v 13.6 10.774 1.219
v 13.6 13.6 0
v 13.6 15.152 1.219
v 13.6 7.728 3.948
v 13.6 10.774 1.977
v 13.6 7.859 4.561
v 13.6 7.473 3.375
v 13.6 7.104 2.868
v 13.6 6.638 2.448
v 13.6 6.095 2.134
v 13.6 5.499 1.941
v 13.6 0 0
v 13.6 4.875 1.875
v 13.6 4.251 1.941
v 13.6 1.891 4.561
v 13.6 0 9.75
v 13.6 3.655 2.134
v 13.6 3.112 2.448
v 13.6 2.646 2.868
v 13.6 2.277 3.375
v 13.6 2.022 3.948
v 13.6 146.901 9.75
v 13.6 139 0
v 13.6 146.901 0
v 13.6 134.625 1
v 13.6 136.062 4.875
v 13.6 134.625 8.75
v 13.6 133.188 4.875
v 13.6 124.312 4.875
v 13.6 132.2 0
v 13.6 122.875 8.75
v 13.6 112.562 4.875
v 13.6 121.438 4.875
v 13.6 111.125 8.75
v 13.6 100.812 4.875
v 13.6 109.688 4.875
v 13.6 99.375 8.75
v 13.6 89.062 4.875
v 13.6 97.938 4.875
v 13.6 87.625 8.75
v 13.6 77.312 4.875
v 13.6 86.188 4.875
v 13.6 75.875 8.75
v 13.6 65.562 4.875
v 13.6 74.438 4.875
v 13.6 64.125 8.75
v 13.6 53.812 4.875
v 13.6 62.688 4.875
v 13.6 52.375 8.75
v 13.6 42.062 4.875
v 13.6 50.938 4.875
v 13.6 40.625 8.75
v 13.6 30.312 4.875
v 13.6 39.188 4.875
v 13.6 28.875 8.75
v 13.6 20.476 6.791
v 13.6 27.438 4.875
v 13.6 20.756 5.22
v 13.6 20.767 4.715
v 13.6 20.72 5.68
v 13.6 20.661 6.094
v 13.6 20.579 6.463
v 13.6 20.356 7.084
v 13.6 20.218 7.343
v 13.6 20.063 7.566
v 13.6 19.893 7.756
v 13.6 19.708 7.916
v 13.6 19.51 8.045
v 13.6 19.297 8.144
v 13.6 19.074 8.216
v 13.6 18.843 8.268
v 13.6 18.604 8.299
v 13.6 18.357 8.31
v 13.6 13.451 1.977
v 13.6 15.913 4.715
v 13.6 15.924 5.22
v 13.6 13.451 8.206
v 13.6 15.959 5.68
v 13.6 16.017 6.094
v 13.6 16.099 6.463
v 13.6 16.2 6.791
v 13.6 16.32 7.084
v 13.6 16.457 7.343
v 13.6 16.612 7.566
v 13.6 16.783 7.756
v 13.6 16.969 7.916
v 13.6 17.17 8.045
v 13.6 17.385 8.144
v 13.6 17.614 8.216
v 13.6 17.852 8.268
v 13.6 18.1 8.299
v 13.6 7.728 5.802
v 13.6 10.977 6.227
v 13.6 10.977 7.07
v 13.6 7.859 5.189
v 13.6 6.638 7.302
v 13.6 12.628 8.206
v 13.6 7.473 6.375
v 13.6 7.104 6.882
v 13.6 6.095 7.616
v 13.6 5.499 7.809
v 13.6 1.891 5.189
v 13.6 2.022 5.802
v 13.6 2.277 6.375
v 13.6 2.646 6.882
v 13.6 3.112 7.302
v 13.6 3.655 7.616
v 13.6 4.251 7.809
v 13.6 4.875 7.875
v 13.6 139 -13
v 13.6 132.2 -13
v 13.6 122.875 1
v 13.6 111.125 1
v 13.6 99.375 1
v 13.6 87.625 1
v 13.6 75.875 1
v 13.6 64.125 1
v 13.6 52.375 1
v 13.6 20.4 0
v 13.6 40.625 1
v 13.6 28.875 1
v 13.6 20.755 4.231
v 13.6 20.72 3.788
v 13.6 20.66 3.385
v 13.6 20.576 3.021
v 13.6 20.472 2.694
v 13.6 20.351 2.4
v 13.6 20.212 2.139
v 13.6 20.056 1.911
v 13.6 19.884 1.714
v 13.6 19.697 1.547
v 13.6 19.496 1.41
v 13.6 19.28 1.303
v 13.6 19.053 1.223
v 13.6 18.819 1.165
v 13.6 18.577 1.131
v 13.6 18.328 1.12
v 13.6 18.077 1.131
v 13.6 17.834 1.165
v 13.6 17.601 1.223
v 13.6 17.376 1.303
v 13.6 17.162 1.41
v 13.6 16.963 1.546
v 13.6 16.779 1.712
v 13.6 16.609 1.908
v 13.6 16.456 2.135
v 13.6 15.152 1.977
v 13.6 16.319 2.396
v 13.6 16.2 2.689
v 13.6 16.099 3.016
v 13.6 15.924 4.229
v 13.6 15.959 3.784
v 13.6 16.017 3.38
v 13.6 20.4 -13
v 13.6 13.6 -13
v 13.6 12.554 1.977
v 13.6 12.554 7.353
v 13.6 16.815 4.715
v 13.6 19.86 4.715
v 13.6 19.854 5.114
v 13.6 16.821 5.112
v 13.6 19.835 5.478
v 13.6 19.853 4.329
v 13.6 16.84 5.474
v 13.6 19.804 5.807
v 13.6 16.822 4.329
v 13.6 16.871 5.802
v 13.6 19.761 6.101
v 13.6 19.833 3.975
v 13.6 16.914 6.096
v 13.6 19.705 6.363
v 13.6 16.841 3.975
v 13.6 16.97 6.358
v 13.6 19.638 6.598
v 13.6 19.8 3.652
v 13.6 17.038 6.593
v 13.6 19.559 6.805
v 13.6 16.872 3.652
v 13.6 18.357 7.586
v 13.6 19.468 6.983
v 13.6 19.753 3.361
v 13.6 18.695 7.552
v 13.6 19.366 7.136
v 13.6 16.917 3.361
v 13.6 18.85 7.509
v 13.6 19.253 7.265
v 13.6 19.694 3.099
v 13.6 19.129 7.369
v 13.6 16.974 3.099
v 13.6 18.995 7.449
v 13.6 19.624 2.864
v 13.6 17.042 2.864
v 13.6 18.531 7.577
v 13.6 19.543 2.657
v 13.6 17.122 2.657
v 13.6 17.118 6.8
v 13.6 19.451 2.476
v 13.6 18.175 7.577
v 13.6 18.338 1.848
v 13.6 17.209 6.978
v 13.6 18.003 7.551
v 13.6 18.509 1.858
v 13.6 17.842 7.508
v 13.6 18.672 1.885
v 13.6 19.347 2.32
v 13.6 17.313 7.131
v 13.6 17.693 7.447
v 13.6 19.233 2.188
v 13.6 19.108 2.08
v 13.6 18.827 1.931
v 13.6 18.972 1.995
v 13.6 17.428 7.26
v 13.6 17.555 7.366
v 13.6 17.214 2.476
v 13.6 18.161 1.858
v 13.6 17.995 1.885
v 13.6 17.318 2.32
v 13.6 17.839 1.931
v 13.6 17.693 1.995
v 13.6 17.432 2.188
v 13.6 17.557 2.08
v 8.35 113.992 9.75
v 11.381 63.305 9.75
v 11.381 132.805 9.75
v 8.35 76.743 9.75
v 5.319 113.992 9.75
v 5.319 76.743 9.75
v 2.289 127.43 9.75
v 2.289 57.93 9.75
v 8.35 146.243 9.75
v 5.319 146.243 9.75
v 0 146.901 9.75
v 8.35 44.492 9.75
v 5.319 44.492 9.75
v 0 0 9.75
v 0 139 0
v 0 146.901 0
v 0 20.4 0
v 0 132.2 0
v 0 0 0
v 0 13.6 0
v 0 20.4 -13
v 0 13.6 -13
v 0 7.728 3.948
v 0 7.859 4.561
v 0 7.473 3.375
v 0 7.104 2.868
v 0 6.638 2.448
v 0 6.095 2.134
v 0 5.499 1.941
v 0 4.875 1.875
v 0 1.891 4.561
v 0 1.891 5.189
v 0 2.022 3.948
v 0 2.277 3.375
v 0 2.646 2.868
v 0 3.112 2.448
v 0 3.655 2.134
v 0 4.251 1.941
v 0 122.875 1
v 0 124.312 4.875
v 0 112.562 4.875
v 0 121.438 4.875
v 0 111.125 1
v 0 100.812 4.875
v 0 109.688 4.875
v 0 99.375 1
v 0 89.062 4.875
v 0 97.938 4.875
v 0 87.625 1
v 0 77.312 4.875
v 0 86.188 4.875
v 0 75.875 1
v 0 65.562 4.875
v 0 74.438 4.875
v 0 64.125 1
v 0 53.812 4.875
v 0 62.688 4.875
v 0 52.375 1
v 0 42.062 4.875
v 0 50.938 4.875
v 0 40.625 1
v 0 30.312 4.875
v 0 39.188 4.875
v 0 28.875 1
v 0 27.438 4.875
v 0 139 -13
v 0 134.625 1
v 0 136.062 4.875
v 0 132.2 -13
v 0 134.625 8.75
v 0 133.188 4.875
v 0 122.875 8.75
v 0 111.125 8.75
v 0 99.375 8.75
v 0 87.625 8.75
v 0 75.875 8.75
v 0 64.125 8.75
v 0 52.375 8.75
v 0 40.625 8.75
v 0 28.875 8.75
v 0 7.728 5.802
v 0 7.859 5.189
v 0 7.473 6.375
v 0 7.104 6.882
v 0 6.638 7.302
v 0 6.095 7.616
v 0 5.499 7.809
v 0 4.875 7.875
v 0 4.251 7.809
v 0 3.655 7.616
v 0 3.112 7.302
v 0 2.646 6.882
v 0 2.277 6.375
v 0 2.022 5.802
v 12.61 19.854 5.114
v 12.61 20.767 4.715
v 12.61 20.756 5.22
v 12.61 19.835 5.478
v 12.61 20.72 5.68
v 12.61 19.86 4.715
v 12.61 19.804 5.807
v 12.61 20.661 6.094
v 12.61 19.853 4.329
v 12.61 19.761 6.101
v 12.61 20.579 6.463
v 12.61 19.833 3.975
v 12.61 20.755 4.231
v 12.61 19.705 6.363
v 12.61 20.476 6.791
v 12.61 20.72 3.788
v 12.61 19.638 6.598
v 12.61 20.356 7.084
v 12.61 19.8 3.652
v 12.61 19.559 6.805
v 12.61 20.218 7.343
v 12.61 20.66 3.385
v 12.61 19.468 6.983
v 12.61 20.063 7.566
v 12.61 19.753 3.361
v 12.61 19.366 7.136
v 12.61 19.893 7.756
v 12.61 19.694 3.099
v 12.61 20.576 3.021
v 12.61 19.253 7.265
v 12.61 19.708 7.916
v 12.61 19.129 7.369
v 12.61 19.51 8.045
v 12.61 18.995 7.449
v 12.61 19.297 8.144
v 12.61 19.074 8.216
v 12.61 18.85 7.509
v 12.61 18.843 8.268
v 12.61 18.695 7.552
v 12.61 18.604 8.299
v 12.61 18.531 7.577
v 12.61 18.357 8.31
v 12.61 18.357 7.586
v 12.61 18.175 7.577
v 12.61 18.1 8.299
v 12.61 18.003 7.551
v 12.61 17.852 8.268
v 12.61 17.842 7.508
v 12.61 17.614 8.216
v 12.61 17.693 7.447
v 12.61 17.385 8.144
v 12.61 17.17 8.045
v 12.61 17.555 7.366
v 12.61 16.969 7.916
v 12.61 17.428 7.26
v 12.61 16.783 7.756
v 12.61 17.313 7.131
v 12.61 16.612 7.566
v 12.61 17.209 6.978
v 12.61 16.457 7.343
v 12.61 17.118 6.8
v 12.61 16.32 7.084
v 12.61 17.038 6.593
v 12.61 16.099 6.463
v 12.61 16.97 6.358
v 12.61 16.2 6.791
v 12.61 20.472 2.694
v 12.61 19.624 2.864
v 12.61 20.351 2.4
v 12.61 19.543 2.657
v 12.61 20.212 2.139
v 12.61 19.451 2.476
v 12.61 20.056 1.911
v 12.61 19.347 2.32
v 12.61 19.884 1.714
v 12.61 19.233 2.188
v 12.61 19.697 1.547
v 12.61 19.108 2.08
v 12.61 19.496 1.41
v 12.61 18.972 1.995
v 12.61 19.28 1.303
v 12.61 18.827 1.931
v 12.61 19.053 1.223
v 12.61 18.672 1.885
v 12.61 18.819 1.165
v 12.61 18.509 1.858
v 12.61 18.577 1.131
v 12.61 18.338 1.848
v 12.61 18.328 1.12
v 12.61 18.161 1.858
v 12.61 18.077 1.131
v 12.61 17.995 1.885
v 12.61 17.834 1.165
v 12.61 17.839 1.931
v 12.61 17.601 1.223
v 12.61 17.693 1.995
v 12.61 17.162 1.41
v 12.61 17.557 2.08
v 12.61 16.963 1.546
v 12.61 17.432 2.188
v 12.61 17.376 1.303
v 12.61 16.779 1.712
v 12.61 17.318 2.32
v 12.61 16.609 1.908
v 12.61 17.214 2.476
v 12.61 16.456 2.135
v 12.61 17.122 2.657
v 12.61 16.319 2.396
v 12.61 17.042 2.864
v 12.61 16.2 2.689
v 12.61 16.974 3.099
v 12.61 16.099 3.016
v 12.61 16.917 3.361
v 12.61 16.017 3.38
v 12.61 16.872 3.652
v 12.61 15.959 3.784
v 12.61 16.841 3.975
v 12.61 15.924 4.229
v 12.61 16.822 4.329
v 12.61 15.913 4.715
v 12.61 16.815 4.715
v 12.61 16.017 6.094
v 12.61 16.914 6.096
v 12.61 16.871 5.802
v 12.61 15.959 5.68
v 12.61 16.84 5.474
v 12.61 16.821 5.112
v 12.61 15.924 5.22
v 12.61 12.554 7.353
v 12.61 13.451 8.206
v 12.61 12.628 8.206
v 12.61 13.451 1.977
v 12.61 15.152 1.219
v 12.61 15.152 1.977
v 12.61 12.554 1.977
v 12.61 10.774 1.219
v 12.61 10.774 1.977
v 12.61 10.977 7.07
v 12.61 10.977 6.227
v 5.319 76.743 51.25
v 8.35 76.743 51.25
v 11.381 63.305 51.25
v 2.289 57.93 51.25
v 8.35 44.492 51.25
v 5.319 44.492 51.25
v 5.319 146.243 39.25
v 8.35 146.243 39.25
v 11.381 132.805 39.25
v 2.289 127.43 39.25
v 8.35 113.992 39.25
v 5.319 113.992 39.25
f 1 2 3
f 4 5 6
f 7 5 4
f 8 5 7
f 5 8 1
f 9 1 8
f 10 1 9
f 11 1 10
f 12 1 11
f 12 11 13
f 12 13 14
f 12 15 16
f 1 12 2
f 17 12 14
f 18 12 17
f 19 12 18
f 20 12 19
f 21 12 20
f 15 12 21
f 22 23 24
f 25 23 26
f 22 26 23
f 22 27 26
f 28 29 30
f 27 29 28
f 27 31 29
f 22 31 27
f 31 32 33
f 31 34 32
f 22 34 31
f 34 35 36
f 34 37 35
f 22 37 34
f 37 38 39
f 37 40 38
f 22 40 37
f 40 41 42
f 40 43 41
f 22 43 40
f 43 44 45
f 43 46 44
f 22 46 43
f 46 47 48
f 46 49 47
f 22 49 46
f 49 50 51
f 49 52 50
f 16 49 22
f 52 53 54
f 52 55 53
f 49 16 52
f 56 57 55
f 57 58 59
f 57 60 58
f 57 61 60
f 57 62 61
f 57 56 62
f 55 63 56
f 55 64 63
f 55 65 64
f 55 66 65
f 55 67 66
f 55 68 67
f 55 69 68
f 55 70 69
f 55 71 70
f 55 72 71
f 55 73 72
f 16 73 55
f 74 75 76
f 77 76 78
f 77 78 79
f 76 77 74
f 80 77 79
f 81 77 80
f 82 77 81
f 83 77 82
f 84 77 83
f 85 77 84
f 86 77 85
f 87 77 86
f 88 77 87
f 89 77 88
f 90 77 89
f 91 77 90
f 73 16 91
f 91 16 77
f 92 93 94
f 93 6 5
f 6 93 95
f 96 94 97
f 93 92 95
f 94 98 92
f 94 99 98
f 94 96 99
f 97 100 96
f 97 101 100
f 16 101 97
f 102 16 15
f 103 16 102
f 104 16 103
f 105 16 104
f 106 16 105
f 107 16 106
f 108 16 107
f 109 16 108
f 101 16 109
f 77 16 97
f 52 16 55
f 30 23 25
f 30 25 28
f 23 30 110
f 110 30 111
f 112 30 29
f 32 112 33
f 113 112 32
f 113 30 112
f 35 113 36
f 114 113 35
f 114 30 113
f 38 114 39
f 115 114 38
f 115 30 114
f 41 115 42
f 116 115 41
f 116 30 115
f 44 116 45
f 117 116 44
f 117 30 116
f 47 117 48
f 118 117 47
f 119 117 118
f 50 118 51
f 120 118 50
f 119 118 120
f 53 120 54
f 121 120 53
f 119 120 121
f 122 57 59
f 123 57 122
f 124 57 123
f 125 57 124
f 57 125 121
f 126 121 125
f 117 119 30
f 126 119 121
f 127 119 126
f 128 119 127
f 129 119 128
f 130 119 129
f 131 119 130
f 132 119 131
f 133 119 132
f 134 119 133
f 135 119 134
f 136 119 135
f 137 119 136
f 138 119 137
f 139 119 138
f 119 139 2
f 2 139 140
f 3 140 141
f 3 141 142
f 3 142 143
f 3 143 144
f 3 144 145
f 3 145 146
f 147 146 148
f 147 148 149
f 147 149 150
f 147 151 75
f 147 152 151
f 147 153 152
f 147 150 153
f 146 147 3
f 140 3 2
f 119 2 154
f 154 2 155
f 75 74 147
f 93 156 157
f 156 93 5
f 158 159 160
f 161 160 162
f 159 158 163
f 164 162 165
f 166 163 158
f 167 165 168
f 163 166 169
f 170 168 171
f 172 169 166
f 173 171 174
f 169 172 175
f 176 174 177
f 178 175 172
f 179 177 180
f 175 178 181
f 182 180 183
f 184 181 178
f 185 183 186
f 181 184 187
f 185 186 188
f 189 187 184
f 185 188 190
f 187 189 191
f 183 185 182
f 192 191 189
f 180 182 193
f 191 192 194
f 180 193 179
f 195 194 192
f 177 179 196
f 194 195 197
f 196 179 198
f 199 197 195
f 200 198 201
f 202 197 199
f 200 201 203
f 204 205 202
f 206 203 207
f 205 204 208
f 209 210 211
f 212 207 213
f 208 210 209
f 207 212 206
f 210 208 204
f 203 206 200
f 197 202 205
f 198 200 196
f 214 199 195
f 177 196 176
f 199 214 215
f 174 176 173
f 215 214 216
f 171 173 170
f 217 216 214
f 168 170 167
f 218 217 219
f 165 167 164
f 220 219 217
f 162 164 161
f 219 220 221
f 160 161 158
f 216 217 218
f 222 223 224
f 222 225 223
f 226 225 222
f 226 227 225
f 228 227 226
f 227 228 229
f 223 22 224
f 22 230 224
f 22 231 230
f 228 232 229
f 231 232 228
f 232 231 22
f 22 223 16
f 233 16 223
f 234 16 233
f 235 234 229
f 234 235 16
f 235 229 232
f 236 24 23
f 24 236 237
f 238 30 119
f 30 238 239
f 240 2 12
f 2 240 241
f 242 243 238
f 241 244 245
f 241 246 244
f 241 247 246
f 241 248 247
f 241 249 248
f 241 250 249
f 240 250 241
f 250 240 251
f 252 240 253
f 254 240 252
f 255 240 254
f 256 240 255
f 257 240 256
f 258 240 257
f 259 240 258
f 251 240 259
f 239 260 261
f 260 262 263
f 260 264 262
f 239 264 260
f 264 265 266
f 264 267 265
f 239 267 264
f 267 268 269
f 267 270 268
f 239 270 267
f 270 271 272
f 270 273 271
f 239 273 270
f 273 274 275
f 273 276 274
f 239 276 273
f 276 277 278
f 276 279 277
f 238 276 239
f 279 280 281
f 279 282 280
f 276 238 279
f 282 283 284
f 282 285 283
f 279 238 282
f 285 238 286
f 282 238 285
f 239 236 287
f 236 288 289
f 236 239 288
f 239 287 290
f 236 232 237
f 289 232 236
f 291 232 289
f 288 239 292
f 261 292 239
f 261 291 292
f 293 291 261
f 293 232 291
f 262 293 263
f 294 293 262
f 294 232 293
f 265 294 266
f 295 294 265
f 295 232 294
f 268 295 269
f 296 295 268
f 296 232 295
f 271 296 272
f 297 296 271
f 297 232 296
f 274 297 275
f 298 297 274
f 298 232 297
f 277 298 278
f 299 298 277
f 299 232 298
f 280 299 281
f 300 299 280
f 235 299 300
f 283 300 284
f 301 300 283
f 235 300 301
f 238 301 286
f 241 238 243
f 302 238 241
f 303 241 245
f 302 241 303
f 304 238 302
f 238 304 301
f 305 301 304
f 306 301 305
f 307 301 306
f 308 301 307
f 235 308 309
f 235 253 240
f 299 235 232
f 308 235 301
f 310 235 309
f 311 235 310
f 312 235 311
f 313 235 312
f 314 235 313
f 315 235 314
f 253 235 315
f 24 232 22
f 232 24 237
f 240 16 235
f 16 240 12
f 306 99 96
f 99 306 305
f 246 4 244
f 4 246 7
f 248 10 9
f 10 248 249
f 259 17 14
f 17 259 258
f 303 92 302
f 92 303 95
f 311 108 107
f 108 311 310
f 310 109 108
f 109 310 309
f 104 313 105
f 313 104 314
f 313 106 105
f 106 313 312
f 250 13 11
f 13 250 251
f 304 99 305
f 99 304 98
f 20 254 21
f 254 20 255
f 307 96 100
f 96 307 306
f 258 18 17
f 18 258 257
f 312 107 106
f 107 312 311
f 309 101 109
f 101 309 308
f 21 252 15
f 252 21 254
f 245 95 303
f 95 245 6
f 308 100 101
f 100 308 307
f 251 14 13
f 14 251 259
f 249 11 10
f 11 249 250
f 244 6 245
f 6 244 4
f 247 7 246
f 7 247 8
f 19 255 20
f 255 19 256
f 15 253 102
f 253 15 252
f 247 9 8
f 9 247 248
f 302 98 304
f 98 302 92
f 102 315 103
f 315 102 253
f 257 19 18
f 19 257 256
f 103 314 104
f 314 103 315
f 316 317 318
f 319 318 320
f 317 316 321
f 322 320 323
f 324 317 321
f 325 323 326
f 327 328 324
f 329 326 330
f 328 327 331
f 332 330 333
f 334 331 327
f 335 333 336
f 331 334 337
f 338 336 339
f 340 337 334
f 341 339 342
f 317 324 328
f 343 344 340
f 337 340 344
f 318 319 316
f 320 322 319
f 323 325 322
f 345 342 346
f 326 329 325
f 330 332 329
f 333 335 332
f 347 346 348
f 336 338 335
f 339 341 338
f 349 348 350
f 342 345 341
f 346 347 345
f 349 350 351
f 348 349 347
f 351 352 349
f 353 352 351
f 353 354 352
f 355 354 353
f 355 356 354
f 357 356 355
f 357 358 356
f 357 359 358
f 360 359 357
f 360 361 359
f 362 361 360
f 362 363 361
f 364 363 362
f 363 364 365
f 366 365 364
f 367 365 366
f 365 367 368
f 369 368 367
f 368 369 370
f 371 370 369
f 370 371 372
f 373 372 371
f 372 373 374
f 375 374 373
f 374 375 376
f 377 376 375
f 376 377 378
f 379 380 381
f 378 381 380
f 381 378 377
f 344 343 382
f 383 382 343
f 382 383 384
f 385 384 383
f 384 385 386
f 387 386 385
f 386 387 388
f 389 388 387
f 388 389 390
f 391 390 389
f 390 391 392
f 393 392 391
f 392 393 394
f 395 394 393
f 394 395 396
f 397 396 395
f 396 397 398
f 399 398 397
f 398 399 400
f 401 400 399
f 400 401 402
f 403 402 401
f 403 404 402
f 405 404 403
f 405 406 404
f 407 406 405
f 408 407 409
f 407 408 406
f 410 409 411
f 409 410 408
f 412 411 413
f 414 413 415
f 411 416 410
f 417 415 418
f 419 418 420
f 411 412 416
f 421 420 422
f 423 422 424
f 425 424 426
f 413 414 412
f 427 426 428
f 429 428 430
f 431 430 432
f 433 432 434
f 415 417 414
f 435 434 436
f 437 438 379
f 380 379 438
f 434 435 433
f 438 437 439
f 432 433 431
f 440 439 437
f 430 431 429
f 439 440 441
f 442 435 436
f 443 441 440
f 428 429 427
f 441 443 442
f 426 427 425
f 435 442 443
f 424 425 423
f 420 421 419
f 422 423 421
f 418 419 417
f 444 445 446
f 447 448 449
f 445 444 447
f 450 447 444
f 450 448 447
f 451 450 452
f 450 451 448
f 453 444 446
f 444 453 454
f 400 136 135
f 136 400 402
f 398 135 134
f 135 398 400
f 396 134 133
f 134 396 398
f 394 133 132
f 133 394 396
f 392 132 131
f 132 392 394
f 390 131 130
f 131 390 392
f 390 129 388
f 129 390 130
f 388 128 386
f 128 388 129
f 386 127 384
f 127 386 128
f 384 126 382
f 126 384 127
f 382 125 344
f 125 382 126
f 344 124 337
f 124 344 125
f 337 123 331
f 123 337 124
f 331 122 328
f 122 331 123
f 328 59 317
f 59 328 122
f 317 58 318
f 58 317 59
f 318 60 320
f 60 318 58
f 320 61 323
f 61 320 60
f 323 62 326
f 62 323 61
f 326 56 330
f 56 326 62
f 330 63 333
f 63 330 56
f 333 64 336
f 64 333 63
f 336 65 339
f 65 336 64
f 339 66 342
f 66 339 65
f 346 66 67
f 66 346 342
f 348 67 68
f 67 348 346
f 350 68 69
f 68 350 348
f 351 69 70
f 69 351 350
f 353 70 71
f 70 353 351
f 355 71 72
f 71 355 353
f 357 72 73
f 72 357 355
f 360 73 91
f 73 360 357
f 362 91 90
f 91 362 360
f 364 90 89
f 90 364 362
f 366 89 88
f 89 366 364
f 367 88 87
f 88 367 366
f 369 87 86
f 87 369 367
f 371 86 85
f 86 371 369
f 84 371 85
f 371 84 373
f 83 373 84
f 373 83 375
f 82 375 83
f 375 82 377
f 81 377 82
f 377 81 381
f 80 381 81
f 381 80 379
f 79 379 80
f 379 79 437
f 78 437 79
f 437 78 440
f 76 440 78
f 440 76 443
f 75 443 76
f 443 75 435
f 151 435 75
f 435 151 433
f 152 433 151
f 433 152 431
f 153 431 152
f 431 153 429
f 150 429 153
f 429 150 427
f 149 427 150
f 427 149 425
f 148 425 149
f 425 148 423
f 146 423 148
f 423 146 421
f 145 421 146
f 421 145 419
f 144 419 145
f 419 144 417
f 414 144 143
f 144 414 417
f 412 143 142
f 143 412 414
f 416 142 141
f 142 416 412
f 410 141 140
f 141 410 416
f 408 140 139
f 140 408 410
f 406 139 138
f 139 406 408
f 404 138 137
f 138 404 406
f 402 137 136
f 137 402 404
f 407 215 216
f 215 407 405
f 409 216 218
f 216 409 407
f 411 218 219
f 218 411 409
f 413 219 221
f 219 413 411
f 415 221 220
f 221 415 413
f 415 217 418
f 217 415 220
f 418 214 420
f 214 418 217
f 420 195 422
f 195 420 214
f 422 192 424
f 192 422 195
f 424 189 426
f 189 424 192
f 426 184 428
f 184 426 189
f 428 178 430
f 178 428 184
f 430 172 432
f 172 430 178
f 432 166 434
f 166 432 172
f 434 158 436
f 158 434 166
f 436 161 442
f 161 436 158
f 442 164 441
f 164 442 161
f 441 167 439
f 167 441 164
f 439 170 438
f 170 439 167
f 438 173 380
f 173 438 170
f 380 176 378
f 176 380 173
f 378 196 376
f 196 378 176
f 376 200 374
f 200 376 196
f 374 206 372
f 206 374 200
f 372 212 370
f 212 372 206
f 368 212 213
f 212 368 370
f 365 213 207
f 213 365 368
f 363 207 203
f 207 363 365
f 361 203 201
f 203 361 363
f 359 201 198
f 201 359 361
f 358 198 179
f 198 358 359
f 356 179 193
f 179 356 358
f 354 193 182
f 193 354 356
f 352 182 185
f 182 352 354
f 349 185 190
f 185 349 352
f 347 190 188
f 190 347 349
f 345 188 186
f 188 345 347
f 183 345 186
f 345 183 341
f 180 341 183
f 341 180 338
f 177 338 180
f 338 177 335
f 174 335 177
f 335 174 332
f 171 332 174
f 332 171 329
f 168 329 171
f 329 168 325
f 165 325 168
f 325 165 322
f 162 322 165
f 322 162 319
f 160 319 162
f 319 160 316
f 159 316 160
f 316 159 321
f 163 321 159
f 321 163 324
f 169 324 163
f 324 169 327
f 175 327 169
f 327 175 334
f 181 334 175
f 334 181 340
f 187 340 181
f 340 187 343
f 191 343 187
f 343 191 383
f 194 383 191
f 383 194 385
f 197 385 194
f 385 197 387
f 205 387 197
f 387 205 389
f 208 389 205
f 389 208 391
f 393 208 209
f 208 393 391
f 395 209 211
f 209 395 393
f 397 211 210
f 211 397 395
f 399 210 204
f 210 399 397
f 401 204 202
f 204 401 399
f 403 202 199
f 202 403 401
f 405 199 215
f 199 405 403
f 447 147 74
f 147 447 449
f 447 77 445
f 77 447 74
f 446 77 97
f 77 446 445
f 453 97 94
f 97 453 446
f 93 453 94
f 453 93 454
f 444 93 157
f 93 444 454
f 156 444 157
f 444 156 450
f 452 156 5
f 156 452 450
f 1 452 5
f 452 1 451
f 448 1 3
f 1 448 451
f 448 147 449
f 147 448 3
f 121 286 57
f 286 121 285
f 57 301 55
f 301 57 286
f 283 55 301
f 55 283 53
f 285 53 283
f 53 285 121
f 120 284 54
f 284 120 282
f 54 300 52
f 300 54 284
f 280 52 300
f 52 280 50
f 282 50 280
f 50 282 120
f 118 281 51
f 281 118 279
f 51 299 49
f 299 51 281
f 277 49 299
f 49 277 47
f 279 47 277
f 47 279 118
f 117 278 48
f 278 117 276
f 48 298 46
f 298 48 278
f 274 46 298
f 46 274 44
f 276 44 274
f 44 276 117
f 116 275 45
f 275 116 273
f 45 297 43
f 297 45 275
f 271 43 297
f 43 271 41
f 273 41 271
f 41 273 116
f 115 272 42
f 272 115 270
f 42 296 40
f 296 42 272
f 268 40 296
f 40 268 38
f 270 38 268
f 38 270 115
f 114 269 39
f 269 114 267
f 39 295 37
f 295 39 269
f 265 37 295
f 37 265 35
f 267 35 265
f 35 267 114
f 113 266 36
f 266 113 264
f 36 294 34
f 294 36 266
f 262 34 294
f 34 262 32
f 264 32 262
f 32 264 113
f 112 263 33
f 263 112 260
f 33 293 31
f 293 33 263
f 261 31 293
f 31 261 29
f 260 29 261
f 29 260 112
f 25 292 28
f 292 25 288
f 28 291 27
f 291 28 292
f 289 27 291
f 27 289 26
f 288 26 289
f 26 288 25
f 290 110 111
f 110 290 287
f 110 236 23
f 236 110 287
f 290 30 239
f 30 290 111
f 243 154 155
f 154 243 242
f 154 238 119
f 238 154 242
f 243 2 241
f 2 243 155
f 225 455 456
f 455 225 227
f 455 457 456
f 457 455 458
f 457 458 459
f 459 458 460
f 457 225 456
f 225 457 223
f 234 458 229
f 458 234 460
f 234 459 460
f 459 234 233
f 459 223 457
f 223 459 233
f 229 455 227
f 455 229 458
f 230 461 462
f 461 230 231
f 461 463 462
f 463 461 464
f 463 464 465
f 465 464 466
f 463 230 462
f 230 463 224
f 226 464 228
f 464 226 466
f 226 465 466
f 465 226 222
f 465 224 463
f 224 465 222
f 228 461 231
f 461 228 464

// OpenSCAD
// file: values.scad
$fs=0.1;
//Constants:
edgeRadius=1.5;
underKeyWidth=13.6;
baseHeight=9.75;
genh=5.791666666666667;
a=27.423996629776394;
b=12.370392724366756;
c=12.370392724366756;
d=38.393595281686956;
overhead=65.81759191146335;
keyTravelDistance=13.0;
desiredGamut=24;
shift=3.092598181091689;
holeScale=0.5;
stalkScale=0.48;

Points = [
[shift,a,0],//0
[(b-shift),0,0],//1
[(b+shift),0,0],//2
[(b+c-shift),d,0],//3
[(c+shift),(a+d),0],//4
[(c-shift),(a+d),0],//5
[shift,a,keyTravelDistance],//6
[(b-shift),0,keyTravelDistance],//7
[(b+shift),0,keyTravelDistance],//8
[(b+c-shift),d,keyTravelDistance],//9
[(c+shift),(a+d),keyTravelDistance],//10
[(c-shift),(a+d),keyTravelDistance],//11
];
Faces = [
[0,1,2,3,4,5],
[1,0,6,7],
[2,1,7,8],
[3,2,8,9],
[4,3,9,10],
[5,4,10,11],
[0,5,11,6],
[11,10,9,8,7,6] 
];
// file: keytop.scad
include<values.scad>;
keytop();

module keytopShape(){
polyhedron(Points,Faces);
}
module keytop(){
difference(){
keytopShape();
translate([(b+c)/4,(d+a)/4,-0.1])
scale(holeScale,holeScale,holeScale)
keytopShape();
edge(6,11,1,-1);
edge(6,7,1,1);
edge(7,8,1,1);
edge(8,9,1,1);
edge(9,10,1,-1,-1);
edge(10,11,1,-1);
}
module edge (point1,point2,d1,d2,d3=1){
difference(){
translate([Points[point1][0],Points[point1][1],Points[point1][2]])
rotate([0,90,atan((Points[point2][1]-Points[point1][1])/(Points[point2][0]-Points[point1][0]))])
translate([0,0,d3*30])
rotate(45,0,0)
cube([pow(2*(edgeRadius*edgeRadius),1/2),pow(2*(edgeRadius*edgeRadius),1/2),90],true);
translate([Points[point1][0],Points[point1][1],Points[point1][2]])
rotate([0,90,atan((Points[point2][1]-Points[point1][1])/(Points[point2][0]-Points[point1][0]))])
translate([d1*edgeRadius,d2*edgeRadius,d3*30])
cylinder(90,edgeRadius,edgeRadius, true);
}
}

}
// main file
use<keytop.scad>
include<values.scad>
rotate([0,90,0])10_2();
module 10_2(keytops=false){
length=146.9009252447967;
rotate([0,-90,0]){
//Main Base:
difference(){
cube([underKeyWidth,length,baseHeight],false);
translate([-.1,0.5*baseHeight,0.5*baseHeight])rotate([0,90,0])
cylinder((underKeyWidth+.2),r=3, false);
translate([underKeyWidth-.99,10,0.125*baseHeight])
rotate([90,0,90])
linear_extrude(height=1){
text("10",size=baseHeight*0.75);
}

//Warp Cuts:
translate([-1,0.0+25+0.25*baseHeight,baseHeight-1])
rotate([0,90,0])
linear_extrude(height=underKeyWidth+2)
polygon(points=[[0.5*baseHeight-1,0],[baseHeight-2,0.25*baseHeight-1],[0.5*baseHeight-1,0.5*baseHeight-2],[0,0.25*baseHeight-1]]);
translate([-1,11.75+25+0.25*baseHeight,baseHeight-1])
rotate([0,90,0])
linear_extrude(height=underKeyWidth+2)
polygon(points=[[0.5*baseHeight-1,0],[baseHeight-2,0.25*baseHeight-1],[0.5*baseHeight-1,0.5*baseHeight-2],[0,0.25*baseHeight-1]]);
translate([-1,23.5+25+0.25*baseHeight,baseHeight-1])
rotate([0,90,0])
linear_extrude(height=underKeyWidth+2)
polygon(points=[[0.5*baseHeight-1,0],[baseHeight-2,0.25*baseHeight-1],[0.5*baseHeight-1,0.5*baseHeight-2],[0,0.25*baseHeight-1]]);
translate([-1,35.25+25+0.25*baseHeight,baseHeight-1])
rotate([0,90,0])
linear_extrude(height=underKeyWidth+2)
polygon(points=[[0.5*baseHeight-1,0],[baseHeight-2,0.25*baseHeight-1],[0.5*baseHeight-1,0.5*baseHeight-2],[0,0.25*baseHeight-1]]);
translate([-1,47.0+25+0.25*baseHeight,baseHeight-1])
rotate([0,90,0])
linear_extrude(height=underKeyWidth+2)
polygon(points=[[0.5*baseHeight-1,0],[baseHeight-2,0.25*baseHeight-1],[0.5*baseHeight-1,0.5*baseHeight-2],[0,0.25*baseHeight-1]]);
translate([-1,58.75+25+0.25*baseHeight,baseHeight-1])
rotate([0,90,0])
linear_extrude(height=underKeyWidth+2)
polygon(points=[[0.5*baseHeight-1,0],[baseHeight-2,0.25*baseHeight-1],[0.5*baseHeight-1,0.5*baseHeight-2],[0,0.25*baseHeight-1]]);
translate([-1,70.5+25+0.25*baseHeight,baseHeight-1])
rotate([0,90,0])
linear_extrude(height=underKeyWidth+2)
polygon(points=[[0.5*baseHeight-1,0],[baseHeight-2,0.25*baseHeight-1],[0.5*baseHeight-1,0.5*baseHeight-2],[0,0.25*baseHeight-1]]);
translate([-1,82.25+25+0.25*baseHeight,baseHeight-1])
rotate([0,90,0])
linear_extrude(height=underKeyWidth+2)
polygon(points=[[0.5*baseHeight-1,0],[baseHeight-2,0.25*baseHeight-1],[0.5*baseHeight-1,0.5*baseHeight-2],[0,0.25*baseHeight-1]]);
translate([-1,94.0+25+0.25*baseHeight,baseHeight-1])
rotate([0,90,0])
linear_extrude(height=underKeyWidth+2)
polygon(points=[[0.5*baseHeight-1,0],[baseHeight-2,0.25*baseHeight-1],[0.5*baseHeight-1,0.5*baseHeight-2],[0,0.25*baseHeight-1]]);
translate([-1,105.75+25+0.25*baseHeight,baseHeight-1])
rotate([0,90,0])
linear_extrude(height=underKeyWidth+2)
polygon(points=[[0.5*baseHeight-1,0],[baseHeight-2,0.25*baseHeight-1],[0.5*baseHeight-1,0.5*baseHeight-2],[0,0.25*baseHeight-1]]);
}
//Key Stalks:
translate([shift/4,(genh*2-(d+a)/2+overhead),baseHeight]){
linear_extrude(height=(keyTravelDistance*1.5+desiredGamut-2)){
scale((stalkScale+holeScale)/2,stalkScale)
polygon(points=[
[Points[0][0],Points[0][1]],[Points[1][0],Points[1][1]],[Points[2][0],Points[2][1]],[Points[3][0],Points[3][1]],[Points[4][0],Points[4][1]],[Points[5][0],Points[5][1]],[Points[6][0],Points[6][1]]
]);
}
if(keytops)
translate([0,(-0.5*(a+d)),(keyTravelDistance*1.5+desiredGamut-2+40)])
keytop();
}
translate([shift/4,(genh*14-(d+a)/2+overhead),baseHeight]){
linear_extrude(height=(keyTravelDistance*1.5+desiredGamut-14)){
scale((stalkScale+holeScale)/2,stalkScale)
polygon(points=[
[Points[0][0],Points[0][1]],[Points[1][0],Points[1][1]],[Points[2][0],Points[2][1]],[Points[3][0],Points[3][1]],[Points[4][0],Points[4][1]],[Points[5][0],Points[5][1]],[Points[6][0],Points[6][1]]
]);
}
if(keytops)
translate([0,(-0.5*(a+d)),(keyTravelDistance*1.5+desiredGamut-14+40)])
keytop();
}
//Feet:
difference(){union(){translate([0,132.2,-13.0]){
cube([13.6,6.8,13.0],false);}
translate([0,13.6,-13.0]){
cube([13.6,6.8,13.0],false);}}
}
}}
